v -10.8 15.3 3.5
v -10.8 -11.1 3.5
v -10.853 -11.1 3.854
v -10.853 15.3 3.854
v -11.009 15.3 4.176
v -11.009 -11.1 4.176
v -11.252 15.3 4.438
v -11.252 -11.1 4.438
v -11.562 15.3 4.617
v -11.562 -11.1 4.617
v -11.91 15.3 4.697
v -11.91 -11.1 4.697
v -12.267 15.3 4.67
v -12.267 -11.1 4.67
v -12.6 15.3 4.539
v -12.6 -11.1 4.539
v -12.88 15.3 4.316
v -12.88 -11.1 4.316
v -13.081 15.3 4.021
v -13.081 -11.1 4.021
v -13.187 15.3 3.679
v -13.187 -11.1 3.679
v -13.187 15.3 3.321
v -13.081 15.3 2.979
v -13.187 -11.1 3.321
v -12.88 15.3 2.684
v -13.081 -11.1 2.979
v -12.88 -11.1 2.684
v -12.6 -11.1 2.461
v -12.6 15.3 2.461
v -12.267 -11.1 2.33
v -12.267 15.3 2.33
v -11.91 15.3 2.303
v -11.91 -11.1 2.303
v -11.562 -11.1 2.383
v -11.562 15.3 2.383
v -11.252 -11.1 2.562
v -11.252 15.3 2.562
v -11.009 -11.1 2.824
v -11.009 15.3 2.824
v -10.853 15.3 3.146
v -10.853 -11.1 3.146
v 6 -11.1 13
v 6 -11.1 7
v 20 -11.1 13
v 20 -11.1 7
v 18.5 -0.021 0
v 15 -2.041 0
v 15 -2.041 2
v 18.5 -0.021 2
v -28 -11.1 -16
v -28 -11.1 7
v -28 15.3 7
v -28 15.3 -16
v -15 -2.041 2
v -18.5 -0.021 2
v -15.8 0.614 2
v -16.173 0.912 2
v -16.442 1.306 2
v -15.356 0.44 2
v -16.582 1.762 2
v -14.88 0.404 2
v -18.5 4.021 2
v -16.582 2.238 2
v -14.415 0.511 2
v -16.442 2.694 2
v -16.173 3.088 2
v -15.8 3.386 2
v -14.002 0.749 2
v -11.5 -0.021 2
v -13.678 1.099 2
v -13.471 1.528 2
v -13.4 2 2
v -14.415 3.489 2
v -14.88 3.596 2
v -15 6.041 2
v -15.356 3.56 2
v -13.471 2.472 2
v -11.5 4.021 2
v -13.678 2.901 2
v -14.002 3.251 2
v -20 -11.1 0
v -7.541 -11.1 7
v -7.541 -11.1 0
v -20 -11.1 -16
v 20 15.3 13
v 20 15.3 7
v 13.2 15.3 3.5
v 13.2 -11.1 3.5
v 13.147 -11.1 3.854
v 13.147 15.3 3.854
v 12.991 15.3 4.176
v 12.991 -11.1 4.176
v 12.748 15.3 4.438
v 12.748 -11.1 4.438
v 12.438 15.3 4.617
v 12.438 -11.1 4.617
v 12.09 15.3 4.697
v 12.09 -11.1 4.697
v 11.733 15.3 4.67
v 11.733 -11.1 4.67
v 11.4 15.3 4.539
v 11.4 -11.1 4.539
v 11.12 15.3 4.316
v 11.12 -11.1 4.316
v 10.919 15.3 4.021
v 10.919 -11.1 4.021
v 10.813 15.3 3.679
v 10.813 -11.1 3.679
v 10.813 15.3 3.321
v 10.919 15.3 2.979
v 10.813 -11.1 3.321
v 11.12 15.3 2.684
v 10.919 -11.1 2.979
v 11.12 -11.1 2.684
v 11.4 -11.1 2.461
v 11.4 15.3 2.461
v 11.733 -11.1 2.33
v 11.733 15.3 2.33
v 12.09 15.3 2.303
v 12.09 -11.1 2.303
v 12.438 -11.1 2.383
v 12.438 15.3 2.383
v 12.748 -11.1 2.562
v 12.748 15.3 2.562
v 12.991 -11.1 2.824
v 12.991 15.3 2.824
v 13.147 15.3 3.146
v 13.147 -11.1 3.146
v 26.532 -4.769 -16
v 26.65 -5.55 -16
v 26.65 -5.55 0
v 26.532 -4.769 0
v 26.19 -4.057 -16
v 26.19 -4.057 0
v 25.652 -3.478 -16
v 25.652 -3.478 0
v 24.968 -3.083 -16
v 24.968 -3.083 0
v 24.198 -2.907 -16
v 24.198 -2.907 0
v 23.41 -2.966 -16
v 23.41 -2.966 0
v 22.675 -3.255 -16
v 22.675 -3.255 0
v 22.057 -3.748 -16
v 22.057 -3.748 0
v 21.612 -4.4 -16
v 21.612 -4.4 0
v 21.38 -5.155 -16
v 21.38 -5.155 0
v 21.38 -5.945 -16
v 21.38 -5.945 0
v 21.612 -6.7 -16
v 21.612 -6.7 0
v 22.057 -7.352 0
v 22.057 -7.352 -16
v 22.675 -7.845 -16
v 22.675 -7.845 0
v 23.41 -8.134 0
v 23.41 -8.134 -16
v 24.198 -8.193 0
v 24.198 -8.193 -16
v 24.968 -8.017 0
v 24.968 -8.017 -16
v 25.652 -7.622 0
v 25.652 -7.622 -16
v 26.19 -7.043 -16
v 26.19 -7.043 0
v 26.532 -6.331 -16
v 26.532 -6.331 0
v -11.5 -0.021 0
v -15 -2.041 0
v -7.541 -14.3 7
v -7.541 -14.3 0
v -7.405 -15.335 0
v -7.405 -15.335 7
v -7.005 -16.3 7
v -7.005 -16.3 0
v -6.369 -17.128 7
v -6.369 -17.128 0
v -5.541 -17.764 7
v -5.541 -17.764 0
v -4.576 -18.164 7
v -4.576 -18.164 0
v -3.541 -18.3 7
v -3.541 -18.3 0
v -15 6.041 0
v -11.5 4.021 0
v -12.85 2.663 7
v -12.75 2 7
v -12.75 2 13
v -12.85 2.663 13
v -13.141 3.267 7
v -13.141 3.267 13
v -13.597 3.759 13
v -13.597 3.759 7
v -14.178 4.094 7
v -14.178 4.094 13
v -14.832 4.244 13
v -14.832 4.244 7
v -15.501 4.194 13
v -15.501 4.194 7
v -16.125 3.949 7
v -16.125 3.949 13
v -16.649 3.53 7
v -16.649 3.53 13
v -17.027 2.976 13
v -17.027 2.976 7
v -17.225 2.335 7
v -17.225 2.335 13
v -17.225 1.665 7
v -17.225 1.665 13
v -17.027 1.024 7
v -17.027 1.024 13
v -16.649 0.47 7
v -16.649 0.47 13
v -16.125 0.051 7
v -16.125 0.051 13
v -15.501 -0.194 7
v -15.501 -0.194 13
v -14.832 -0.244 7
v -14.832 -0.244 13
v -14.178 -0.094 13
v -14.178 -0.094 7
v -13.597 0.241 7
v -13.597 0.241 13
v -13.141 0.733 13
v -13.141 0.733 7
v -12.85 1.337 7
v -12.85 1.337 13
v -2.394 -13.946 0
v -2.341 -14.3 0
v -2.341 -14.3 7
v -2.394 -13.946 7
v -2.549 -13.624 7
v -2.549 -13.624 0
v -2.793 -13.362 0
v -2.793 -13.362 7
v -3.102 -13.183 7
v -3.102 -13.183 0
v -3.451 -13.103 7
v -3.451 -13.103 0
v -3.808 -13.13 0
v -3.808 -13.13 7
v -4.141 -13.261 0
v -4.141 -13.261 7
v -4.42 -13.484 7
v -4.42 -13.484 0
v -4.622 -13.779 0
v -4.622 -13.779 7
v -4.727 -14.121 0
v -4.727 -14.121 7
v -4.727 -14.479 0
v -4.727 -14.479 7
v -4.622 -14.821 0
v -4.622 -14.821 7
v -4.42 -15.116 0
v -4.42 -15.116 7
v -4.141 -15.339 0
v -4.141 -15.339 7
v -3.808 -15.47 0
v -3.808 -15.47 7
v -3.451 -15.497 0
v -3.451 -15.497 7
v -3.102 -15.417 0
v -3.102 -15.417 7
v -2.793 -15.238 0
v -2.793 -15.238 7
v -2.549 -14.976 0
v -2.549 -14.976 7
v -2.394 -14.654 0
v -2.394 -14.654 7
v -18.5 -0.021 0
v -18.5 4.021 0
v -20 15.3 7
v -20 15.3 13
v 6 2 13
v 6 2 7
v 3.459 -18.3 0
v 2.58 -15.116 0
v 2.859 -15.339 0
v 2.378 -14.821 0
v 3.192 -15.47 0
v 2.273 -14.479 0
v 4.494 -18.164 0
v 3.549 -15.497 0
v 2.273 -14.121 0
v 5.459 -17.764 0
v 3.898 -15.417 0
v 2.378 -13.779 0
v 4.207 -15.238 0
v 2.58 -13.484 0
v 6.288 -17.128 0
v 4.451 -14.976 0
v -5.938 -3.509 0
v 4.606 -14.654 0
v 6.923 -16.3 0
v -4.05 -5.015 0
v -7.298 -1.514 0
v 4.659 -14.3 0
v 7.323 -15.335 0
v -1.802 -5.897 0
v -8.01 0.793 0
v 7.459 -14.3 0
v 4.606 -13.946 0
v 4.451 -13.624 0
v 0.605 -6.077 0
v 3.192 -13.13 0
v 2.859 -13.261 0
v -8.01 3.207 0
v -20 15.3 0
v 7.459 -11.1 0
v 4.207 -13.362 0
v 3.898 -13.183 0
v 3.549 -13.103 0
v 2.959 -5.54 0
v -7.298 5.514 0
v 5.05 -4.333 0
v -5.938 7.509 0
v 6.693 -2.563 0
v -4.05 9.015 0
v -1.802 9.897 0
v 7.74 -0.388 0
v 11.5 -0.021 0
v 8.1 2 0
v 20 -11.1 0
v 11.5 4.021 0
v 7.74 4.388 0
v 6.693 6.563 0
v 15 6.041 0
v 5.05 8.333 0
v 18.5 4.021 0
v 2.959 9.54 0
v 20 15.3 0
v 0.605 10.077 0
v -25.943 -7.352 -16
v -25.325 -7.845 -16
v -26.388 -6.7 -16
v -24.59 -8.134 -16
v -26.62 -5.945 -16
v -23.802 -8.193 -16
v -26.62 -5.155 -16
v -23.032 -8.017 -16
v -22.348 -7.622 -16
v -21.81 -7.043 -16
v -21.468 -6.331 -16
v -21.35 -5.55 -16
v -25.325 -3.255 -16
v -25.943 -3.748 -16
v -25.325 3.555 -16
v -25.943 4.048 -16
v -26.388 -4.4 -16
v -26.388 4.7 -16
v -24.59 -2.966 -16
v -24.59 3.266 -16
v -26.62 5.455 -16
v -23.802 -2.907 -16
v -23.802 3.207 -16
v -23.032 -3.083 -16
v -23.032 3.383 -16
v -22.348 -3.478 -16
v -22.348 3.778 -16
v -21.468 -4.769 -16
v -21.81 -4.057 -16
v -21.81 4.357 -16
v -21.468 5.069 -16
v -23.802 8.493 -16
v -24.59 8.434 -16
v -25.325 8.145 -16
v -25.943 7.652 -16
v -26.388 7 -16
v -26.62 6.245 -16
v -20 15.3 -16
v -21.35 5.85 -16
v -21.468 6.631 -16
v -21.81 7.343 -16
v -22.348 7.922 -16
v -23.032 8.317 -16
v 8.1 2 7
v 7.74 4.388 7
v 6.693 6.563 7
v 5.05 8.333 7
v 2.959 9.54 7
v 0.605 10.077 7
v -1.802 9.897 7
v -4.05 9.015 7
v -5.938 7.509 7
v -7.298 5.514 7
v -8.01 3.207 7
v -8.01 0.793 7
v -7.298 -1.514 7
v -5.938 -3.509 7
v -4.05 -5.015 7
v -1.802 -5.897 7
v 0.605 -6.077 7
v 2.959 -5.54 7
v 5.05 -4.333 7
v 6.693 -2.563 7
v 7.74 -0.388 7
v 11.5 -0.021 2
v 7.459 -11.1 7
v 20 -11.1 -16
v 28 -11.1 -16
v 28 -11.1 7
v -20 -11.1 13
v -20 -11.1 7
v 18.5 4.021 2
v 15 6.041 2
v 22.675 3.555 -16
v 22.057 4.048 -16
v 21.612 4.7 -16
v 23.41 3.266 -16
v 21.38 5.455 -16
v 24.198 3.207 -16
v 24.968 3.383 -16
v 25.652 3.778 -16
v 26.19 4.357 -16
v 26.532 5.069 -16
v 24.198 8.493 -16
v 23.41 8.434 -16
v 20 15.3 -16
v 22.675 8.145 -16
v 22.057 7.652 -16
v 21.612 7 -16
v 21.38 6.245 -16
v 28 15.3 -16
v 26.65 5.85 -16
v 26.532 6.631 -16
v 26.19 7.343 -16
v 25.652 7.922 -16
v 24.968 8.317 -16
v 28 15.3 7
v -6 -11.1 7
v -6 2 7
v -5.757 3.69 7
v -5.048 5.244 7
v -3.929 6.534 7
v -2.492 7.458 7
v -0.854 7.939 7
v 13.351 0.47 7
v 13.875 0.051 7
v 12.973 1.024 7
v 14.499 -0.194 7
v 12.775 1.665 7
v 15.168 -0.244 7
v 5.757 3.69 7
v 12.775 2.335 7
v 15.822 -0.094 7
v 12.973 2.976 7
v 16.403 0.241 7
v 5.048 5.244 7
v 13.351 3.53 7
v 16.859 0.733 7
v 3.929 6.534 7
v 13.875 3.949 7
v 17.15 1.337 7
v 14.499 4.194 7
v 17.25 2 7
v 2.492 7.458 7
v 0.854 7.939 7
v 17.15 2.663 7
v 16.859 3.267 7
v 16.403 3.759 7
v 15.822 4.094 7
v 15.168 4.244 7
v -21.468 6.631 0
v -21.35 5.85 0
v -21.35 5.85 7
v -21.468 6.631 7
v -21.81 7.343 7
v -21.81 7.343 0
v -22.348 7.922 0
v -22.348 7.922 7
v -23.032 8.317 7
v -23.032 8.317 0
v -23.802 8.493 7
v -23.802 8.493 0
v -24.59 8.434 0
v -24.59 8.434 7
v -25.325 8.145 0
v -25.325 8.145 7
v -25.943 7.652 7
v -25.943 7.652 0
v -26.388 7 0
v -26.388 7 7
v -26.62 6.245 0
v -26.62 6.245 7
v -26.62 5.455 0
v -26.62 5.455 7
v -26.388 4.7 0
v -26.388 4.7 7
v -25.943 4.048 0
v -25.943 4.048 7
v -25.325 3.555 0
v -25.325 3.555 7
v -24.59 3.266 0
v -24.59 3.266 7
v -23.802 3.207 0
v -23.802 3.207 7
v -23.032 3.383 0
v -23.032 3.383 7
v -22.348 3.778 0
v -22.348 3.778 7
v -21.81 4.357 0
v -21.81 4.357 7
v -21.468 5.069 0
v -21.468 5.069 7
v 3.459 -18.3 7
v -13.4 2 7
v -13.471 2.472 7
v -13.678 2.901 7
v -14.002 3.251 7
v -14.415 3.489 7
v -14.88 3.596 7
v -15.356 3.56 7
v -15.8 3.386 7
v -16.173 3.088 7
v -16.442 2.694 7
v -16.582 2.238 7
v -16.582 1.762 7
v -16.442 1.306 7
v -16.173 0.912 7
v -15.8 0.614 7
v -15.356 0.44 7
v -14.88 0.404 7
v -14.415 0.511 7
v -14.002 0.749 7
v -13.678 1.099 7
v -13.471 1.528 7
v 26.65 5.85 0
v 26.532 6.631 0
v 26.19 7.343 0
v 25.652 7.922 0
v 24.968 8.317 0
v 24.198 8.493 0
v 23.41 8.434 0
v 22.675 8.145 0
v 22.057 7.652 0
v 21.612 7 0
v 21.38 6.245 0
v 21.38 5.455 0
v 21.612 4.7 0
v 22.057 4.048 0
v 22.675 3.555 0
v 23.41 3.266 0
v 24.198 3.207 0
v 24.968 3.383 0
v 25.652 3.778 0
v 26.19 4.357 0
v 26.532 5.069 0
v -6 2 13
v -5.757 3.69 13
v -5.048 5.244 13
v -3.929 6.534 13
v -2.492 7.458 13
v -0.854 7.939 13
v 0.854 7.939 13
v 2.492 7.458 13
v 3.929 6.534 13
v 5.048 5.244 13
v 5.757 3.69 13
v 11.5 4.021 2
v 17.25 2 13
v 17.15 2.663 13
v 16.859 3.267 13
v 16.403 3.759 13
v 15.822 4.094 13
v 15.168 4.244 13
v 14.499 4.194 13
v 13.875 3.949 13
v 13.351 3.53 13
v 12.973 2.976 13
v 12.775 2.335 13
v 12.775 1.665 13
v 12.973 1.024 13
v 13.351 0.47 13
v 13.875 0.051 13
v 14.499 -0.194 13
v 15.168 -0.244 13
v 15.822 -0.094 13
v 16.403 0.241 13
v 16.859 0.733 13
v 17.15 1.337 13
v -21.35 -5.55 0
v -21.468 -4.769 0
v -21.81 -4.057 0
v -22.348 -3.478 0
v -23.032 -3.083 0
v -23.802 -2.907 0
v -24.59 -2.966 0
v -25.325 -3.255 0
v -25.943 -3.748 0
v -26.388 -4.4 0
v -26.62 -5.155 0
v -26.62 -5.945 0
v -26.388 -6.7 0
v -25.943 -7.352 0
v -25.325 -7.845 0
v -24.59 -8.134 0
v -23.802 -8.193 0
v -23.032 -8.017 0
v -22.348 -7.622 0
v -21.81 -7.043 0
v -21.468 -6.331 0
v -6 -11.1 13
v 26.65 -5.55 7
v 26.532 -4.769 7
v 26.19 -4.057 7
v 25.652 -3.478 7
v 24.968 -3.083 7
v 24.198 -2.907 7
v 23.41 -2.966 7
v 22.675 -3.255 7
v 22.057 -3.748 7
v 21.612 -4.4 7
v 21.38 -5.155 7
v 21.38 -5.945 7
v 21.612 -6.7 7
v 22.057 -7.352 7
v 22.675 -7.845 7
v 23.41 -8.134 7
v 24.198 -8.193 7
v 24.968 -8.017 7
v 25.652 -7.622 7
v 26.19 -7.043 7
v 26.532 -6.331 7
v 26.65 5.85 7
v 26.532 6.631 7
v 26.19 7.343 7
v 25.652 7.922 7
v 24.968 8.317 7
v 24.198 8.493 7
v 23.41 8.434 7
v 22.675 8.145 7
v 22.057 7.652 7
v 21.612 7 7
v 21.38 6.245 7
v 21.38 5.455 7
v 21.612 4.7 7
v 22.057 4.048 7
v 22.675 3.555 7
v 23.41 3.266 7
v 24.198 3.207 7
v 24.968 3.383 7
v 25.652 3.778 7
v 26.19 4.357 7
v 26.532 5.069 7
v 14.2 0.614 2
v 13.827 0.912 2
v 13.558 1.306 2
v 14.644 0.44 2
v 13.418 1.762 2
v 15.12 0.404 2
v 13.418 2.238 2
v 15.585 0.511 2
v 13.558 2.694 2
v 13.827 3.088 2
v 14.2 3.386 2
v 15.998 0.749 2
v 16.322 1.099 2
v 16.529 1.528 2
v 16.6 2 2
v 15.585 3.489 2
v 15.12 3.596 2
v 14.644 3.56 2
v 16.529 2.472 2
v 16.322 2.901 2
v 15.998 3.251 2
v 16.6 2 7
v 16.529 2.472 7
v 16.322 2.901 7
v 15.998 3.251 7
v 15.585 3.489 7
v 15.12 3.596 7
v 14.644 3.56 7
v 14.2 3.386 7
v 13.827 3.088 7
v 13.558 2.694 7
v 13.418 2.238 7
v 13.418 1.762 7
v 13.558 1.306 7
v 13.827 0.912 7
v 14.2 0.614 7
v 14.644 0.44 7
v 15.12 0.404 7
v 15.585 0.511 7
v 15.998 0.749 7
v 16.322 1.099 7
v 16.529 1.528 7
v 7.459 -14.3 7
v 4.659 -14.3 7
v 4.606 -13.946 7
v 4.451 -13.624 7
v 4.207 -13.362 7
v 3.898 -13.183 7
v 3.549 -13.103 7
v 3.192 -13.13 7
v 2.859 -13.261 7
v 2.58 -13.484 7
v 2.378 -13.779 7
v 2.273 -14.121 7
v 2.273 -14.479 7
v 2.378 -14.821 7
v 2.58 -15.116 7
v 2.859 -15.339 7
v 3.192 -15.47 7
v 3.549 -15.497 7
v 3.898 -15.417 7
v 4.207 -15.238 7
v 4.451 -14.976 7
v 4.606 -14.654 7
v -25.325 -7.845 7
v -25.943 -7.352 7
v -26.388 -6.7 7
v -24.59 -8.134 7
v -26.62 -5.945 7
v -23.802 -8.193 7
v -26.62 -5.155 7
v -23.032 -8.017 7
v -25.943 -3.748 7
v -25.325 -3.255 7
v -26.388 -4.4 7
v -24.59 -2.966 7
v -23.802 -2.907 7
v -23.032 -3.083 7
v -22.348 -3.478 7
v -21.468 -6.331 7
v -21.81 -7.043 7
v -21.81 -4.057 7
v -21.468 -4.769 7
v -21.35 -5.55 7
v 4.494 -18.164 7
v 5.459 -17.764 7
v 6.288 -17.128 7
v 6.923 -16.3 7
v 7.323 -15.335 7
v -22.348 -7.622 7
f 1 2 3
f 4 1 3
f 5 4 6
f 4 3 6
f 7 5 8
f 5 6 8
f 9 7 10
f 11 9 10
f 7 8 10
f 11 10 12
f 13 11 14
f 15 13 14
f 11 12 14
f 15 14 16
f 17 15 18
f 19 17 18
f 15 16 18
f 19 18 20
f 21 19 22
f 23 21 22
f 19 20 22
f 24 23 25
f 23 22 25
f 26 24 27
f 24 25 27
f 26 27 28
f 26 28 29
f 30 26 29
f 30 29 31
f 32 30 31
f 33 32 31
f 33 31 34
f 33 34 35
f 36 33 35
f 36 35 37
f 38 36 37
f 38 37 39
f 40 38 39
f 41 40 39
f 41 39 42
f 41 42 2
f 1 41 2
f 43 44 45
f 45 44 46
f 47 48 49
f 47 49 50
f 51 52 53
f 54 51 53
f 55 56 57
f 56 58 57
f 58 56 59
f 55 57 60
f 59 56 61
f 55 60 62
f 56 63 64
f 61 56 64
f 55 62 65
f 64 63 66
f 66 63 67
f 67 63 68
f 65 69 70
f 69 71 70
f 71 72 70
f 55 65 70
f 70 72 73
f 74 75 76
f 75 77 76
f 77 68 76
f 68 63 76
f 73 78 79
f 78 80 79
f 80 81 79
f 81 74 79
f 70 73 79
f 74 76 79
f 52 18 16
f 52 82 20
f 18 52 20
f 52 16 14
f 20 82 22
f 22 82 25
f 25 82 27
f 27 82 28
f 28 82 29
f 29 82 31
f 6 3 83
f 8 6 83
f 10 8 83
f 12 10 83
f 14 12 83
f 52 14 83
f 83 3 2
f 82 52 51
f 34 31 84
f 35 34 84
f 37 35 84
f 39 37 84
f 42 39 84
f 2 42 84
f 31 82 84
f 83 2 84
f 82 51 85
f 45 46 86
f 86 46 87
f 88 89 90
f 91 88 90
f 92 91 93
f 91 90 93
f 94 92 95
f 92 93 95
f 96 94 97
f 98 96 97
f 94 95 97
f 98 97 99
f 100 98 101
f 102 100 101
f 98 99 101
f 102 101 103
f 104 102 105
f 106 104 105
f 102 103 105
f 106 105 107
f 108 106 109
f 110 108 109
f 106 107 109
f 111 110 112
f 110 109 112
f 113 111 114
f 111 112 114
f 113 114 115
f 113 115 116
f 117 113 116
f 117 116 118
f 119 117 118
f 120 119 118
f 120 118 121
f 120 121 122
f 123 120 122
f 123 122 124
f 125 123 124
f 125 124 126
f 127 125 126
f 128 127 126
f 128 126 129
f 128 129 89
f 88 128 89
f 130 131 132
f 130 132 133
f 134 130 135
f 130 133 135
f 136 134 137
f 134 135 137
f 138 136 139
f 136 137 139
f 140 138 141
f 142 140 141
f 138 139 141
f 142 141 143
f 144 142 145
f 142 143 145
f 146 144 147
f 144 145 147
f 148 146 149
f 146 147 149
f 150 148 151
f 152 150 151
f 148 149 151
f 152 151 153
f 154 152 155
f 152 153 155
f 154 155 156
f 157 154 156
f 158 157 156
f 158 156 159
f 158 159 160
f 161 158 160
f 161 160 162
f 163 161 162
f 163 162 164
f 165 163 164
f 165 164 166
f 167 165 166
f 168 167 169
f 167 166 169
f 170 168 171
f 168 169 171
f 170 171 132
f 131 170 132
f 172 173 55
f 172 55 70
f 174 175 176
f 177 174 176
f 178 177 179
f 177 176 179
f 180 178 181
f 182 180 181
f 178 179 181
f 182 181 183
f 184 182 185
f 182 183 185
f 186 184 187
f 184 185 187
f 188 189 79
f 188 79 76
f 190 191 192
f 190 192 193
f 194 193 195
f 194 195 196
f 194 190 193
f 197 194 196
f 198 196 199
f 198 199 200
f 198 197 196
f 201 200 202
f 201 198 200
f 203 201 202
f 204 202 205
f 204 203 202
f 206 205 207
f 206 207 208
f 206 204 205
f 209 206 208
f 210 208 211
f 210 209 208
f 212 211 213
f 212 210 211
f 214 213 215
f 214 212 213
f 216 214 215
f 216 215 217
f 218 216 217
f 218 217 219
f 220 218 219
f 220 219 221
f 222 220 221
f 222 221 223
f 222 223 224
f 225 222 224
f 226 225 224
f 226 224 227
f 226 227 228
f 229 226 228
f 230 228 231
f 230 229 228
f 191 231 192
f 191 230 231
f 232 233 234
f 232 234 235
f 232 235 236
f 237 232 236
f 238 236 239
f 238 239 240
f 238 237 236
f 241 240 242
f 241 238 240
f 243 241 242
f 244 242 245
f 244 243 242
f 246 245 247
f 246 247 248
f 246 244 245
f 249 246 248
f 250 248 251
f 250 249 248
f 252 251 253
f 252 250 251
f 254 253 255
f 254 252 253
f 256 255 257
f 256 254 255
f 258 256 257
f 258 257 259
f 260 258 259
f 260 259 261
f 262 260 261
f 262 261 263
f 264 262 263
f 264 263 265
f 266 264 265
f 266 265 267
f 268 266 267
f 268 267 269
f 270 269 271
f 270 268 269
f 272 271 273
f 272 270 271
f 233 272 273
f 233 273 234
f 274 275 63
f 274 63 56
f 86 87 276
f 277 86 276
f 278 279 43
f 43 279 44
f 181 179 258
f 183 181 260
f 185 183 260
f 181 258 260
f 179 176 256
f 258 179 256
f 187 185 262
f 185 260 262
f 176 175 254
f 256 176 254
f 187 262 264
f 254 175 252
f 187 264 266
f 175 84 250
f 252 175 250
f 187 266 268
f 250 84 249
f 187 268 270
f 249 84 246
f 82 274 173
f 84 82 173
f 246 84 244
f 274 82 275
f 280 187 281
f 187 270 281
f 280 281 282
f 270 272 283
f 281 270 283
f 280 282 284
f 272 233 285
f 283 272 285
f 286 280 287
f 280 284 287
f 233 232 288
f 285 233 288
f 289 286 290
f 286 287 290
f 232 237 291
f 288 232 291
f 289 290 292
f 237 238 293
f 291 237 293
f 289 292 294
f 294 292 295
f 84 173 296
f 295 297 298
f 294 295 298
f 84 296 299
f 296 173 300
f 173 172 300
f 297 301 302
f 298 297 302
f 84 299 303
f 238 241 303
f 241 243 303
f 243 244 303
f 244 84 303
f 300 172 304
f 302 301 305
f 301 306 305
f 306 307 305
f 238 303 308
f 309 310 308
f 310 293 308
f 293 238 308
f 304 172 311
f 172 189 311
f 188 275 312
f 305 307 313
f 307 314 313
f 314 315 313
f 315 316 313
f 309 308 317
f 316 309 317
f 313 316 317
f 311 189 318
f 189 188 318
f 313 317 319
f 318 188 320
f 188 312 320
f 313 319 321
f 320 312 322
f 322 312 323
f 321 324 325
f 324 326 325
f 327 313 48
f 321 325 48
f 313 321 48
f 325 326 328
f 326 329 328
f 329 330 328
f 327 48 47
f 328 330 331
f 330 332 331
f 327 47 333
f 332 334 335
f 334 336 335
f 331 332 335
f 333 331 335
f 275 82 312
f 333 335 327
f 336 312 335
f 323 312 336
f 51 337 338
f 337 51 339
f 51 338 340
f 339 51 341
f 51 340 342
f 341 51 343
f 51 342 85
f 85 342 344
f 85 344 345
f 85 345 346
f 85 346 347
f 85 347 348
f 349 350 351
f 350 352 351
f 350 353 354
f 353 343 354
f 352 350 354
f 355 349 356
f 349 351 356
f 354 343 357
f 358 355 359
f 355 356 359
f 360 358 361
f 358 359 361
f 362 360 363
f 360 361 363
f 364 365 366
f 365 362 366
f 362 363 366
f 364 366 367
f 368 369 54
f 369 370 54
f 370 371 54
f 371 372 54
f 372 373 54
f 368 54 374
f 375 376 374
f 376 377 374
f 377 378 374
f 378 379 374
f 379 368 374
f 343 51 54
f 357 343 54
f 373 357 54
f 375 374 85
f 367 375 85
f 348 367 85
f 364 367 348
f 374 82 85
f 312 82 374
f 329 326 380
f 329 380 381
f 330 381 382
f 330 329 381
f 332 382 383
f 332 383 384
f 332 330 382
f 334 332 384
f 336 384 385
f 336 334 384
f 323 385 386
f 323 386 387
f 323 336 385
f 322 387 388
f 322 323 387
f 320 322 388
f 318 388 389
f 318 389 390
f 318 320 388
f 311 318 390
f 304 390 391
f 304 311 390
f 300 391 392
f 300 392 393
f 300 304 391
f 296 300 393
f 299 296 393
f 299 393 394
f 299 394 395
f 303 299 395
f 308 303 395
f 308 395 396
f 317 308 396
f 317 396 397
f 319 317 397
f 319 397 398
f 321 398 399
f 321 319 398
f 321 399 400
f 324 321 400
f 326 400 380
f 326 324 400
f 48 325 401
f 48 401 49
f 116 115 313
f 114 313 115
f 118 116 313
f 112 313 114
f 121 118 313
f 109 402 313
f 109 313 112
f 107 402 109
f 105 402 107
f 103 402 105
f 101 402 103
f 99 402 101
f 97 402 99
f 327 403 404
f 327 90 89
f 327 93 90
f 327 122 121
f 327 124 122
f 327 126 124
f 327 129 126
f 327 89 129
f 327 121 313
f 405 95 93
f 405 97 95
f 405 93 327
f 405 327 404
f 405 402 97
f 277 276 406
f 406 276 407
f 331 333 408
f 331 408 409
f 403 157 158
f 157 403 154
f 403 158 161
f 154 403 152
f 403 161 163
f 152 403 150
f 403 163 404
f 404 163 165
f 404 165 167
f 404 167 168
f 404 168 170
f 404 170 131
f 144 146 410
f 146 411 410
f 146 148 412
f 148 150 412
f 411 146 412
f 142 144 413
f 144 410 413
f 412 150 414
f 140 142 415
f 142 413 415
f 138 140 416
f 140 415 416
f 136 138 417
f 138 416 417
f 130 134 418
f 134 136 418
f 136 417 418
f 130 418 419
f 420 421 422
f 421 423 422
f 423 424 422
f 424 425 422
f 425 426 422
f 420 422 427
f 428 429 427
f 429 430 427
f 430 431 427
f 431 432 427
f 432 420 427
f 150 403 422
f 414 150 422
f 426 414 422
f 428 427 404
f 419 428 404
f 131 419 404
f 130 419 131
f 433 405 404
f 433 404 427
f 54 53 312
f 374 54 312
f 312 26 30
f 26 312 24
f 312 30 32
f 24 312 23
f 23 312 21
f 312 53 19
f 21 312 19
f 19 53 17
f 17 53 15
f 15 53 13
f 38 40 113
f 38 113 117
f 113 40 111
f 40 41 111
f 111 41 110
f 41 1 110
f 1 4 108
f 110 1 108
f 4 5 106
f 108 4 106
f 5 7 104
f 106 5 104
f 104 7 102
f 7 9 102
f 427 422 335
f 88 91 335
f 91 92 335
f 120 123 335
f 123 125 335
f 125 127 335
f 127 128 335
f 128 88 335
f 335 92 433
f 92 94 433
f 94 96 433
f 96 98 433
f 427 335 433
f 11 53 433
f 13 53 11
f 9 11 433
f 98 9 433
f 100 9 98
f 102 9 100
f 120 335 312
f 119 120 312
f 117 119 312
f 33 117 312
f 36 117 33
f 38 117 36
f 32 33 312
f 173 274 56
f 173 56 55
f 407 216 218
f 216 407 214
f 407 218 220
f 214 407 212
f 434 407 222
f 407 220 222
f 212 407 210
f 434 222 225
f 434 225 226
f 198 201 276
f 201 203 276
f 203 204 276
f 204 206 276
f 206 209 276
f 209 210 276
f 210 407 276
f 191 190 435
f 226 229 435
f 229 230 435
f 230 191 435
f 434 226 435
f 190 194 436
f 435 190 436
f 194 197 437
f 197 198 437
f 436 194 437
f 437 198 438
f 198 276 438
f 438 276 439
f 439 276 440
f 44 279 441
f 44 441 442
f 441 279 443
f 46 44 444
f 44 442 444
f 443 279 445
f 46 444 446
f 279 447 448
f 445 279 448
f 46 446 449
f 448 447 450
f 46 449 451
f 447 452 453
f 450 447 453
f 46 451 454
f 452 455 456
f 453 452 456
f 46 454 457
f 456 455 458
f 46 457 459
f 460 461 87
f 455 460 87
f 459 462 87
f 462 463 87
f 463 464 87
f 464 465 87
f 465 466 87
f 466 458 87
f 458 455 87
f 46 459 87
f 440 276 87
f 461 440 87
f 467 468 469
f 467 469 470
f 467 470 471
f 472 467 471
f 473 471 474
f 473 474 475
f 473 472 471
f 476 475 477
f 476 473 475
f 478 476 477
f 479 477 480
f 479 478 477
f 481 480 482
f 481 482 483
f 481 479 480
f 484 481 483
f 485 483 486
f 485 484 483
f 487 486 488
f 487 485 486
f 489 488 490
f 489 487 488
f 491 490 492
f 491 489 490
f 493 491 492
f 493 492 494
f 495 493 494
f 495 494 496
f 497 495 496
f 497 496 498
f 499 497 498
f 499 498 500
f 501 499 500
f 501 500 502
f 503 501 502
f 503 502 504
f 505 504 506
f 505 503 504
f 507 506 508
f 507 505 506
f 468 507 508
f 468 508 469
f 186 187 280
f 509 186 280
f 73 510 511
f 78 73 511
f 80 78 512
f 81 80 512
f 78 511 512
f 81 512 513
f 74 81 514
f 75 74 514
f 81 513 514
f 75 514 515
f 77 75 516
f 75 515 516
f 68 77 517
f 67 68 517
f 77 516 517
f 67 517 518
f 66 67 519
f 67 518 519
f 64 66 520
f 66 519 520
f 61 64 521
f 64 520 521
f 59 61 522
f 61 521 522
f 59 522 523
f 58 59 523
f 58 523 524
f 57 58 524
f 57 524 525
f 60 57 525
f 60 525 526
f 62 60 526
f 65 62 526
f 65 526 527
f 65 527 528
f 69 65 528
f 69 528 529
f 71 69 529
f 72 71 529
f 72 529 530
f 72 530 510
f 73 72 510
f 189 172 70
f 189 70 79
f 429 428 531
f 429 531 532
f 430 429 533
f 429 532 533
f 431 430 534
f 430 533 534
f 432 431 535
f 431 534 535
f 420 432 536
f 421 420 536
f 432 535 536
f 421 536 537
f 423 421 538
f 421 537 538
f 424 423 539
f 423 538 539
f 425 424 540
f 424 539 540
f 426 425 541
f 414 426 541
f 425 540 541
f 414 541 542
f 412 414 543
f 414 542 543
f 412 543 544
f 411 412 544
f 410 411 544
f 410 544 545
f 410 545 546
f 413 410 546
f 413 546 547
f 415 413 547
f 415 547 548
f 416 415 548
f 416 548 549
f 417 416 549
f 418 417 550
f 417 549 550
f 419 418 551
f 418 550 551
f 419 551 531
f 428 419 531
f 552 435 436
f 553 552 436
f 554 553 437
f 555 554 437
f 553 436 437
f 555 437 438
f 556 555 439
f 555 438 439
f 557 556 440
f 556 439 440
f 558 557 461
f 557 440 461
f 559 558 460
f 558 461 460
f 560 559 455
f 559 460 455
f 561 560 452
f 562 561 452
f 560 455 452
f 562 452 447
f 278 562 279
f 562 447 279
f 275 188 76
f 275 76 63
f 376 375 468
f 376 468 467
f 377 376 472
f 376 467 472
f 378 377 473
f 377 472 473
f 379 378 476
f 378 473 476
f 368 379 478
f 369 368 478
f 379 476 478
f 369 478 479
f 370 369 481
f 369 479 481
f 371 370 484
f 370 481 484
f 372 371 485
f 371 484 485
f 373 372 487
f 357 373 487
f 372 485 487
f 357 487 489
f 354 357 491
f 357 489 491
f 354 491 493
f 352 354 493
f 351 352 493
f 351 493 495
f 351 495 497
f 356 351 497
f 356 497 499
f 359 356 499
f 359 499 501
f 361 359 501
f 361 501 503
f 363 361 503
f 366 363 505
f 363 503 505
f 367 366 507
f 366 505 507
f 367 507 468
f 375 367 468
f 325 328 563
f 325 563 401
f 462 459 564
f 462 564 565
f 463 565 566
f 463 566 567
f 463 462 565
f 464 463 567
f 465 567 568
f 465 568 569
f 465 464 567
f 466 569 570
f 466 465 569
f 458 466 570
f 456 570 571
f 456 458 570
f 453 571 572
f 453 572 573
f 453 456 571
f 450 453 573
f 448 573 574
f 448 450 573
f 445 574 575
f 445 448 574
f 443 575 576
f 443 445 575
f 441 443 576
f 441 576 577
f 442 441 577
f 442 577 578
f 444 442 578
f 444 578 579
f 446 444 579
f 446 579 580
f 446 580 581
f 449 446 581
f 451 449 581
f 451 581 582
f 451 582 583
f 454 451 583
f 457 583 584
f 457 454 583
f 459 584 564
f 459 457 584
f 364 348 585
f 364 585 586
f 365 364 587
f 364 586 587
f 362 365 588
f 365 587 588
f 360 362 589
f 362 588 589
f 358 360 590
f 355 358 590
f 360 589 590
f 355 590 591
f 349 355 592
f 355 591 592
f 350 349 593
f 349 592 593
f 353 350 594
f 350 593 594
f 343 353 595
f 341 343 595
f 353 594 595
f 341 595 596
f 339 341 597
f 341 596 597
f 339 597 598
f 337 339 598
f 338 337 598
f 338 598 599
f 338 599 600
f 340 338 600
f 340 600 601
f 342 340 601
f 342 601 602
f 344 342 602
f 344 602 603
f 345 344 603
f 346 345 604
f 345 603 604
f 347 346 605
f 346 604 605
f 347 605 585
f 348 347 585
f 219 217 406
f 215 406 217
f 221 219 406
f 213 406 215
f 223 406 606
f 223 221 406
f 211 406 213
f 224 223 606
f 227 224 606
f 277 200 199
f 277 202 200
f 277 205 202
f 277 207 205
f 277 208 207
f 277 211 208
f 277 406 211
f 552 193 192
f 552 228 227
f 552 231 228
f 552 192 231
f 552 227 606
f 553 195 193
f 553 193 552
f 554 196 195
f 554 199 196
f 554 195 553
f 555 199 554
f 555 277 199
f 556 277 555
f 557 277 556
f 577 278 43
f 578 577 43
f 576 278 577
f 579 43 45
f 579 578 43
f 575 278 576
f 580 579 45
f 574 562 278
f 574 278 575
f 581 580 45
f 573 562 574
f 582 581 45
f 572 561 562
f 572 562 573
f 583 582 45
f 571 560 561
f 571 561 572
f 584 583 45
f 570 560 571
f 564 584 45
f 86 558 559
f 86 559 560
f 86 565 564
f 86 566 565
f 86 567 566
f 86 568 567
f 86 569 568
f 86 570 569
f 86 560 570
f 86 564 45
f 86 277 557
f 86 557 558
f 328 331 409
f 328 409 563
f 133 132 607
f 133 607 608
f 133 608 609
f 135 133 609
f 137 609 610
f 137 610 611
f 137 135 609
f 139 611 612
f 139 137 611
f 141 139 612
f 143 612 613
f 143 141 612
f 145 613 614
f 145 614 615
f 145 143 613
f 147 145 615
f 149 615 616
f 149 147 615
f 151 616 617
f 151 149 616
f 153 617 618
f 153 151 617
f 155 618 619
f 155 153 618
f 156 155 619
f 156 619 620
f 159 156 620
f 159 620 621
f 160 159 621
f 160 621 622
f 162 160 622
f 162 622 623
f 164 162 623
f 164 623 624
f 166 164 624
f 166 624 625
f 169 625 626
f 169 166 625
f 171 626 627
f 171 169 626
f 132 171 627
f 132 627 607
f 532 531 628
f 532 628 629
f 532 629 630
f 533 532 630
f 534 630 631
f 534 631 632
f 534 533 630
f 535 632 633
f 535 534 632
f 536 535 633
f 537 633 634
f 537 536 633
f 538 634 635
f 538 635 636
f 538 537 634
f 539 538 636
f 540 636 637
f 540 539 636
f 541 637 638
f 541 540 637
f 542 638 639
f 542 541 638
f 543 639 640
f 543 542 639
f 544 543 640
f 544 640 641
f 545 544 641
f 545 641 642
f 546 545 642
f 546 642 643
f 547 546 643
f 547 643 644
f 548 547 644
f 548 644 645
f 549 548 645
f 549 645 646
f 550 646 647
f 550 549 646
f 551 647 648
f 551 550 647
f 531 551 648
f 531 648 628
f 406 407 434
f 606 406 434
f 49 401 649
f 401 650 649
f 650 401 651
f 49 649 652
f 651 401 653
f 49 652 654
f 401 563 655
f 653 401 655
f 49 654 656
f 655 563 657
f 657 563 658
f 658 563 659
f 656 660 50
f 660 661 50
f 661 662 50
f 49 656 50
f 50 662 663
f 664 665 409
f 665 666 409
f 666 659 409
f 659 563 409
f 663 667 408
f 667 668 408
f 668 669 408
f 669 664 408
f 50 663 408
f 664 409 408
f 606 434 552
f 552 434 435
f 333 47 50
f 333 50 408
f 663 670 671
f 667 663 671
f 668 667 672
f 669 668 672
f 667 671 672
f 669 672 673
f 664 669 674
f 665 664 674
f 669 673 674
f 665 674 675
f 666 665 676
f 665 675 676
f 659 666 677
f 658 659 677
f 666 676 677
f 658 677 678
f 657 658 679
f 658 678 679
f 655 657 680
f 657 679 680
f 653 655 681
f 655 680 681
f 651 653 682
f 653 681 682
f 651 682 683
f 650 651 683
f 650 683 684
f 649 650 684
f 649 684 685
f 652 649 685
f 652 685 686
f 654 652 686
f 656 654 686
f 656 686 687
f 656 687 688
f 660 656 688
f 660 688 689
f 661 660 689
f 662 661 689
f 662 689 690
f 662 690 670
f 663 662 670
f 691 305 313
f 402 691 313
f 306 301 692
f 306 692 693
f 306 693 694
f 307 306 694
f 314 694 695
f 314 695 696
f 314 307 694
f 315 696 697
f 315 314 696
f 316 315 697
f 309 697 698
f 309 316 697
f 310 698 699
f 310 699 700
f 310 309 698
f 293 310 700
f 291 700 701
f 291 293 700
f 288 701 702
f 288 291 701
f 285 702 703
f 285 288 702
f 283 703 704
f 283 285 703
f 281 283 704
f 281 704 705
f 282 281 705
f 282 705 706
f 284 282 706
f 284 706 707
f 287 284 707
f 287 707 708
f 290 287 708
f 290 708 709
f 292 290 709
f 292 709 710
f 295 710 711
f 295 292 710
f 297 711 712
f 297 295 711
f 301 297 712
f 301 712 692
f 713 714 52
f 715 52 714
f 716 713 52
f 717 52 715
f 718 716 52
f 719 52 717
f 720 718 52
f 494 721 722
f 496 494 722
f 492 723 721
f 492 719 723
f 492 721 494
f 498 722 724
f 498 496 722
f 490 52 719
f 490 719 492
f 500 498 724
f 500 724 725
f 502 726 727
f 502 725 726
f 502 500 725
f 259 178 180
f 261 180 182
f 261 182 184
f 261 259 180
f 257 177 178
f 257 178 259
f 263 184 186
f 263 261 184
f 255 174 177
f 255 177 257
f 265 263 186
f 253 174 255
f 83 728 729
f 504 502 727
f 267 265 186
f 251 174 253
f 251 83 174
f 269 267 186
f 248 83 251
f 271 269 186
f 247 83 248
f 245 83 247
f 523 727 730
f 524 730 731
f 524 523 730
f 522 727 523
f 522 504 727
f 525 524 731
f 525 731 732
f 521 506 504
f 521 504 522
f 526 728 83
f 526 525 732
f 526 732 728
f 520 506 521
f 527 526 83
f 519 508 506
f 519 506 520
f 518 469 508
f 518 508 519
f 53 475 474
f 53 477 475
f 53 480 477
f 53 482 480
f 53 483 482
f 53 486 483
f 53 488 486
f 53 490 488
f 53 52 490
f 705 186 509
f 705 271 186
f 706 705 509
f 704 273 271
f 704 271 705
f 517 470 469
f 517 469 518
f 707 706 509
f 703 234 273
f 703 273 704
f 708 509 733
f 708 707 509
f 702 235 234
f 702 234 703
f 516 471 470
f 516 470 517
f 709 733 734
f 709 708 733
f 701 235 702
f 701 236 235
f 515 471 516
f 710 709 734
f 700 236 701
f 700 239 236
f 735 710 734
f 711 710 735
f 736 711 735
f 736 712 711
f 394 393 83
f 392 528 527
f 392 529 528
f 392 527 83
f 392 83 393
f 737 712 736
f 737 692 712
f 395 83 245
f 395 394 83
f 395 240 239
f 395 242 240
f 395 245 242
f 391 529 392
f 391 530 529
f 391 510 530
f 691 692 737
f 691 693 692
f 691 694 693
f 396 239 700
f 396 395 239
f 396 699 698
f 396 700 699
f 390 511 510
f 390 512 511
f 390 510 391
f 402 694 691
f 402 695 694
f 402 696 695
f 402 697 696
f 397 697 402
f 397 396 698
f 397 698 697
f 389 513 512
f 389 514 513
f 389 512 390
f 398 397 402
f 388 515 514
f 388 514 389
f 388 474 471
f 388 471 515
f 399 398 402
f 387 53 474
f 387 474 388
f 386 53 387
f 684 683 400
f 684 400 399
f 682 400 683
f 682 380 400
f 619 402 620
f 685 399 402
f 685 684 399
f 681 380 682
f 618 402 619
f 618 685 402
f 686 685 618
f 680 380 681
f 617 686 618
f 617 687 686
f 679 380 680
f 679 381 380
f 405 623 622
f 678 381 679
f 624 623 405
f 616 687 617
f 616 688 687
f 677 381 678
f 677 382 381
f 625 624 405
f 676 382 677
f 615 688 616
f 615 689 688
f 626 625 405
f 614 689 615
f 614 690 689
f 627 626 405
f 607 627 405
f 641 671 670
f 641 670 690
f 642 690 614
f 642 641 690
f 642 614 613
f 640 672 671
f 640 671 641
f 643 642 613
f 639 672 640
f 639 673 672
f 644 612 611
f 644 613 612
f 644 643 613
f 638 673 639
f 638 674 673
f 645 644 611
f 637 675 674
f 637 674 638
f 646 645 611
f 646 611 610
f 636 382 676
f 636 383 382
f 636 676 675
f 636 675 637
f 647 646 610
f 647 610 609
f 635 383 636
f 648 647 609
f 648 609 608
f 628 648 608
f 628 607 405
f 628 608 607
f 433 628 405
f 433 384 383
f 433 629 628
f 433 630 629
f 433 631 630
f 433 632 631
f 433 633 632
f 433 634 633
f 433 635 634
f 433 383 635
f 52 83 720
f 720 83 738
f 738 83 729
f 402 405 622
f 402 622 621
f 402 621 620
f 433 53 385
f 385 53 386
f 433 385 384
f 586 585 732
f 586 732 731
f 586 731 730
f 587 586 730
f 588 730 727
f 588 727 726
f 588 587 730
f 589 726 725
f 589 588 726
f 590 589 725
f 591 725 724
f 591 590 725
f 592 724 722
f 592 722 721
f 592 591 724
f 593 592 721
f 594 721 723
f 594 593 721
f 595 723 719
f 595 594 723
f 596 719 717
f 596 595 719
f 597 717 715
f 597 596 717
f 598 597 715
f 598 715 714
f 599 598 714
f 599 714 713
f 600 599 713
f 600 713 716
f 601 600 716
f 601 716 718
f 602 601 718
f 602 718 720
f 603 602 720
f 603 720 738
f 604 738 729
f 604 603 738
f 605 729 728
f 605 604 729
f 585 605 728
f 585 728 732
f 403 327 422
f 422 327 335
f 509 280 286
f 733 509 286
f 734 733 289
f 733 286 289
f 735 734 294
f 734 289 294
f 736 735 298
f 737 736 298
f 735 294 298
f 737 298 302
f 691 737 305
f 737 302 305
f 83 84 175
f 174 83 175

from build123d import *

# Parameters (mm, degrees)
F0_R     = 1.2
F0_R_2   = 8.1
F0_W     = 8
F0_H     = 26.4
F0_R_3   = 2.65
F1_DEPTH = 7
F2_DEPTH = 16
F4_D     = 2.4
F5_R     = 1.6
F6_DEPTH = 25
F8_DEPTH = 2
F5_R_2   = 2.25
F9_DEPTH = 6


with BuildPart() as f1:
    # F0 (on Top) → F1 (new body)
    with BuildSketch(Plane.XY):
        with BuildLine():
            Line((20, 15.3), (-20, 15.3))
            Line((-20, 15.3), (-20, -11.1))
            Line((-20, -11.1), (-7.540837, -11.1))
            Line((-7.540837, -11.1), (-7.540837, -14.3))
            ThreePointArc((-7.540837, -14.3), (-6.369264, -17.128427), (-3.540837, -18.3))
            Line((-3.540837, -18.3), (3.459163, -18.3))
            ThreePointArc((3.459163, -18.3), (6.287591, -17.128427), (7.459163, -14.3))
            Line((7.459163, -14.3), (7.459163, -11.1))
            Line((7.459163, -11.1), (20, -11.1))
            Line((20, -11.1), (20, 15.3))
        make_face()
        with Locations((-3.540837, -14.3)):
            Circle(F0_R, mode=Mode.SUBTRACT)
        with Locations((3.459163, -14.3)):
            Circle(F0_R, mode=Mode.SUBTRACT)
        with Locations((0, 2)):
            Circle(F0_R_2, mode=Mode.SUBTRACT)
        with Locations((-24, 2.1)):
            Rectangle(F0_W, F0_H)
        with Locations((-24, -5.55)):
            Circle(F0_R_3, mode=Mode.SUBTRACT)
        with Locations((-24, 5.85)):
            Circle(F0_R_3, mode=Mode.SUBTRACT)
        with Locations((24, 2.1)):
            Rectangle(F0_W, F0_H)
        with Locations((24, -5.55)):
            Circle(F0_R_3, mode=Mode.SUBTRACT)
        with Locations((24, 5.85)):
            Circle(F0_R_3, mode=Mode.SUBTRACT)
    extrude(amount=F1_DEPTH)

    # F0 (on Top) → F2 (join)
    with BuildSketch(Plane.XY):
        with Locations((24, 2.1)):
            Rectangle(F0_W, F0_H)
        with Locations((24, -5.55)):
            Circle(F0_R_3, mode=Mode.SUBTRACT)
        with Locations((24, 5.85)):
            Circle(F0_R_3, mode=Mode.SUBTRACT)
        with Locations((-24, 2.1)):
            Rectangle(F0_W, F0_H)
        with Locations((-24, -5.55)):
            Circle(F0_R_3, mode=Mode.SUBTRACT)
        with Locations((-24, 5.85)):
            Circle(F0_R_3, mode=Mode.SUBTRACT)
    extrude(amount=-F2_DEPTH)

    # F4 (through all)
    with Locations(Plane(origin=(0, 15.3, 0), x_dir=(-1, 0, 0), z_dir=(0, 1, 0))):
        with Locations((-12, 3.5), (12, 3.5)):
            Hole(F4_D / 2)

    # F5 (on face) → F6 (cut)
    with BuildSketch(Plane.XY.offset(7)):
        with Locations((15, 2)):
            Circle(F5_R)
        with Locations((-15, 2)):
            Circle(F5_R)
    extrude(amount=-F6_DEPTH, mode=Mode.SUBTRACT)

    # F7 (on face) → F8 (cut)
    with BuildSketch(Plane.XY):
        Polygon((-11.5, -0.020726), (-11.5, 4.020726), (-15, 6.041452), (-18.5, 4.020726), (-18.5, -0.020726), (-15, -2.041452), align=None)
        Polygon((11.5, 4.020726), (11.5, -0.020726), (15, -2.041452), (18.5, -0.020726), (18.5, 4.020726), (15, 6.041452), align=None)
    extrude(amount=F8_DEPTH, mode=Mode.SUBTRACT)


with BuildPart() as f9:
    # F5 (on face) → F9 (new body)
    with BuildSketch(Plane.XY.offset(7)):
        with BuildLine():
            ThreePointArc((8.1, 2), (7.556785, -0.916333), (6, -3.441507))
            Line((6, -3.441507), (6, -11.1))
            Line((6, -11.1), (7.459163, -11.1))
            Line((7.459163, -11.1), (20, -11.1))
            Line((20, -11.1), (20, 15.3))
            Line((20, 15.3), (-20, 15.3))
            Line((-20, 15.3), (-20, -11.1))
            Line((-20, -11.1), (-7.540837, -11.1))
            Line((-7.540837, -11.1), (-6, -11.1))
            Line((-6, -11.1), (-6, -3.441507))
            ThreePointArc((-6, -3.441507), (-2.916333, 9.556785), (8.1, 2))
        make_face()
        with Locations((-15, 2)):
            Circle(F5_R_2, mode=Mode.SUBTRACT)
        with Locations((15, 2)):
            Circle(F5_R_2, mode=Mode.SUBTRACT)
        with BuildLine():
            ThreePointArc((-6, 2), (0, 8), (6, 2))
            Line((6, 2), (6, -3.441507))
            ThreePointArc((6, -3.441507), (7.556785, -0.916333), (8.1, 2))
            ThreePointArc((8.1, 2), (-2.916333, 9.556785), (-6, -3.441507))
            Line((-6, -3.441507), (-6, 2))
        make_face()
    extrude(amount=F9_DEPTH)


solid = Compound([f1.part, f9.part])
